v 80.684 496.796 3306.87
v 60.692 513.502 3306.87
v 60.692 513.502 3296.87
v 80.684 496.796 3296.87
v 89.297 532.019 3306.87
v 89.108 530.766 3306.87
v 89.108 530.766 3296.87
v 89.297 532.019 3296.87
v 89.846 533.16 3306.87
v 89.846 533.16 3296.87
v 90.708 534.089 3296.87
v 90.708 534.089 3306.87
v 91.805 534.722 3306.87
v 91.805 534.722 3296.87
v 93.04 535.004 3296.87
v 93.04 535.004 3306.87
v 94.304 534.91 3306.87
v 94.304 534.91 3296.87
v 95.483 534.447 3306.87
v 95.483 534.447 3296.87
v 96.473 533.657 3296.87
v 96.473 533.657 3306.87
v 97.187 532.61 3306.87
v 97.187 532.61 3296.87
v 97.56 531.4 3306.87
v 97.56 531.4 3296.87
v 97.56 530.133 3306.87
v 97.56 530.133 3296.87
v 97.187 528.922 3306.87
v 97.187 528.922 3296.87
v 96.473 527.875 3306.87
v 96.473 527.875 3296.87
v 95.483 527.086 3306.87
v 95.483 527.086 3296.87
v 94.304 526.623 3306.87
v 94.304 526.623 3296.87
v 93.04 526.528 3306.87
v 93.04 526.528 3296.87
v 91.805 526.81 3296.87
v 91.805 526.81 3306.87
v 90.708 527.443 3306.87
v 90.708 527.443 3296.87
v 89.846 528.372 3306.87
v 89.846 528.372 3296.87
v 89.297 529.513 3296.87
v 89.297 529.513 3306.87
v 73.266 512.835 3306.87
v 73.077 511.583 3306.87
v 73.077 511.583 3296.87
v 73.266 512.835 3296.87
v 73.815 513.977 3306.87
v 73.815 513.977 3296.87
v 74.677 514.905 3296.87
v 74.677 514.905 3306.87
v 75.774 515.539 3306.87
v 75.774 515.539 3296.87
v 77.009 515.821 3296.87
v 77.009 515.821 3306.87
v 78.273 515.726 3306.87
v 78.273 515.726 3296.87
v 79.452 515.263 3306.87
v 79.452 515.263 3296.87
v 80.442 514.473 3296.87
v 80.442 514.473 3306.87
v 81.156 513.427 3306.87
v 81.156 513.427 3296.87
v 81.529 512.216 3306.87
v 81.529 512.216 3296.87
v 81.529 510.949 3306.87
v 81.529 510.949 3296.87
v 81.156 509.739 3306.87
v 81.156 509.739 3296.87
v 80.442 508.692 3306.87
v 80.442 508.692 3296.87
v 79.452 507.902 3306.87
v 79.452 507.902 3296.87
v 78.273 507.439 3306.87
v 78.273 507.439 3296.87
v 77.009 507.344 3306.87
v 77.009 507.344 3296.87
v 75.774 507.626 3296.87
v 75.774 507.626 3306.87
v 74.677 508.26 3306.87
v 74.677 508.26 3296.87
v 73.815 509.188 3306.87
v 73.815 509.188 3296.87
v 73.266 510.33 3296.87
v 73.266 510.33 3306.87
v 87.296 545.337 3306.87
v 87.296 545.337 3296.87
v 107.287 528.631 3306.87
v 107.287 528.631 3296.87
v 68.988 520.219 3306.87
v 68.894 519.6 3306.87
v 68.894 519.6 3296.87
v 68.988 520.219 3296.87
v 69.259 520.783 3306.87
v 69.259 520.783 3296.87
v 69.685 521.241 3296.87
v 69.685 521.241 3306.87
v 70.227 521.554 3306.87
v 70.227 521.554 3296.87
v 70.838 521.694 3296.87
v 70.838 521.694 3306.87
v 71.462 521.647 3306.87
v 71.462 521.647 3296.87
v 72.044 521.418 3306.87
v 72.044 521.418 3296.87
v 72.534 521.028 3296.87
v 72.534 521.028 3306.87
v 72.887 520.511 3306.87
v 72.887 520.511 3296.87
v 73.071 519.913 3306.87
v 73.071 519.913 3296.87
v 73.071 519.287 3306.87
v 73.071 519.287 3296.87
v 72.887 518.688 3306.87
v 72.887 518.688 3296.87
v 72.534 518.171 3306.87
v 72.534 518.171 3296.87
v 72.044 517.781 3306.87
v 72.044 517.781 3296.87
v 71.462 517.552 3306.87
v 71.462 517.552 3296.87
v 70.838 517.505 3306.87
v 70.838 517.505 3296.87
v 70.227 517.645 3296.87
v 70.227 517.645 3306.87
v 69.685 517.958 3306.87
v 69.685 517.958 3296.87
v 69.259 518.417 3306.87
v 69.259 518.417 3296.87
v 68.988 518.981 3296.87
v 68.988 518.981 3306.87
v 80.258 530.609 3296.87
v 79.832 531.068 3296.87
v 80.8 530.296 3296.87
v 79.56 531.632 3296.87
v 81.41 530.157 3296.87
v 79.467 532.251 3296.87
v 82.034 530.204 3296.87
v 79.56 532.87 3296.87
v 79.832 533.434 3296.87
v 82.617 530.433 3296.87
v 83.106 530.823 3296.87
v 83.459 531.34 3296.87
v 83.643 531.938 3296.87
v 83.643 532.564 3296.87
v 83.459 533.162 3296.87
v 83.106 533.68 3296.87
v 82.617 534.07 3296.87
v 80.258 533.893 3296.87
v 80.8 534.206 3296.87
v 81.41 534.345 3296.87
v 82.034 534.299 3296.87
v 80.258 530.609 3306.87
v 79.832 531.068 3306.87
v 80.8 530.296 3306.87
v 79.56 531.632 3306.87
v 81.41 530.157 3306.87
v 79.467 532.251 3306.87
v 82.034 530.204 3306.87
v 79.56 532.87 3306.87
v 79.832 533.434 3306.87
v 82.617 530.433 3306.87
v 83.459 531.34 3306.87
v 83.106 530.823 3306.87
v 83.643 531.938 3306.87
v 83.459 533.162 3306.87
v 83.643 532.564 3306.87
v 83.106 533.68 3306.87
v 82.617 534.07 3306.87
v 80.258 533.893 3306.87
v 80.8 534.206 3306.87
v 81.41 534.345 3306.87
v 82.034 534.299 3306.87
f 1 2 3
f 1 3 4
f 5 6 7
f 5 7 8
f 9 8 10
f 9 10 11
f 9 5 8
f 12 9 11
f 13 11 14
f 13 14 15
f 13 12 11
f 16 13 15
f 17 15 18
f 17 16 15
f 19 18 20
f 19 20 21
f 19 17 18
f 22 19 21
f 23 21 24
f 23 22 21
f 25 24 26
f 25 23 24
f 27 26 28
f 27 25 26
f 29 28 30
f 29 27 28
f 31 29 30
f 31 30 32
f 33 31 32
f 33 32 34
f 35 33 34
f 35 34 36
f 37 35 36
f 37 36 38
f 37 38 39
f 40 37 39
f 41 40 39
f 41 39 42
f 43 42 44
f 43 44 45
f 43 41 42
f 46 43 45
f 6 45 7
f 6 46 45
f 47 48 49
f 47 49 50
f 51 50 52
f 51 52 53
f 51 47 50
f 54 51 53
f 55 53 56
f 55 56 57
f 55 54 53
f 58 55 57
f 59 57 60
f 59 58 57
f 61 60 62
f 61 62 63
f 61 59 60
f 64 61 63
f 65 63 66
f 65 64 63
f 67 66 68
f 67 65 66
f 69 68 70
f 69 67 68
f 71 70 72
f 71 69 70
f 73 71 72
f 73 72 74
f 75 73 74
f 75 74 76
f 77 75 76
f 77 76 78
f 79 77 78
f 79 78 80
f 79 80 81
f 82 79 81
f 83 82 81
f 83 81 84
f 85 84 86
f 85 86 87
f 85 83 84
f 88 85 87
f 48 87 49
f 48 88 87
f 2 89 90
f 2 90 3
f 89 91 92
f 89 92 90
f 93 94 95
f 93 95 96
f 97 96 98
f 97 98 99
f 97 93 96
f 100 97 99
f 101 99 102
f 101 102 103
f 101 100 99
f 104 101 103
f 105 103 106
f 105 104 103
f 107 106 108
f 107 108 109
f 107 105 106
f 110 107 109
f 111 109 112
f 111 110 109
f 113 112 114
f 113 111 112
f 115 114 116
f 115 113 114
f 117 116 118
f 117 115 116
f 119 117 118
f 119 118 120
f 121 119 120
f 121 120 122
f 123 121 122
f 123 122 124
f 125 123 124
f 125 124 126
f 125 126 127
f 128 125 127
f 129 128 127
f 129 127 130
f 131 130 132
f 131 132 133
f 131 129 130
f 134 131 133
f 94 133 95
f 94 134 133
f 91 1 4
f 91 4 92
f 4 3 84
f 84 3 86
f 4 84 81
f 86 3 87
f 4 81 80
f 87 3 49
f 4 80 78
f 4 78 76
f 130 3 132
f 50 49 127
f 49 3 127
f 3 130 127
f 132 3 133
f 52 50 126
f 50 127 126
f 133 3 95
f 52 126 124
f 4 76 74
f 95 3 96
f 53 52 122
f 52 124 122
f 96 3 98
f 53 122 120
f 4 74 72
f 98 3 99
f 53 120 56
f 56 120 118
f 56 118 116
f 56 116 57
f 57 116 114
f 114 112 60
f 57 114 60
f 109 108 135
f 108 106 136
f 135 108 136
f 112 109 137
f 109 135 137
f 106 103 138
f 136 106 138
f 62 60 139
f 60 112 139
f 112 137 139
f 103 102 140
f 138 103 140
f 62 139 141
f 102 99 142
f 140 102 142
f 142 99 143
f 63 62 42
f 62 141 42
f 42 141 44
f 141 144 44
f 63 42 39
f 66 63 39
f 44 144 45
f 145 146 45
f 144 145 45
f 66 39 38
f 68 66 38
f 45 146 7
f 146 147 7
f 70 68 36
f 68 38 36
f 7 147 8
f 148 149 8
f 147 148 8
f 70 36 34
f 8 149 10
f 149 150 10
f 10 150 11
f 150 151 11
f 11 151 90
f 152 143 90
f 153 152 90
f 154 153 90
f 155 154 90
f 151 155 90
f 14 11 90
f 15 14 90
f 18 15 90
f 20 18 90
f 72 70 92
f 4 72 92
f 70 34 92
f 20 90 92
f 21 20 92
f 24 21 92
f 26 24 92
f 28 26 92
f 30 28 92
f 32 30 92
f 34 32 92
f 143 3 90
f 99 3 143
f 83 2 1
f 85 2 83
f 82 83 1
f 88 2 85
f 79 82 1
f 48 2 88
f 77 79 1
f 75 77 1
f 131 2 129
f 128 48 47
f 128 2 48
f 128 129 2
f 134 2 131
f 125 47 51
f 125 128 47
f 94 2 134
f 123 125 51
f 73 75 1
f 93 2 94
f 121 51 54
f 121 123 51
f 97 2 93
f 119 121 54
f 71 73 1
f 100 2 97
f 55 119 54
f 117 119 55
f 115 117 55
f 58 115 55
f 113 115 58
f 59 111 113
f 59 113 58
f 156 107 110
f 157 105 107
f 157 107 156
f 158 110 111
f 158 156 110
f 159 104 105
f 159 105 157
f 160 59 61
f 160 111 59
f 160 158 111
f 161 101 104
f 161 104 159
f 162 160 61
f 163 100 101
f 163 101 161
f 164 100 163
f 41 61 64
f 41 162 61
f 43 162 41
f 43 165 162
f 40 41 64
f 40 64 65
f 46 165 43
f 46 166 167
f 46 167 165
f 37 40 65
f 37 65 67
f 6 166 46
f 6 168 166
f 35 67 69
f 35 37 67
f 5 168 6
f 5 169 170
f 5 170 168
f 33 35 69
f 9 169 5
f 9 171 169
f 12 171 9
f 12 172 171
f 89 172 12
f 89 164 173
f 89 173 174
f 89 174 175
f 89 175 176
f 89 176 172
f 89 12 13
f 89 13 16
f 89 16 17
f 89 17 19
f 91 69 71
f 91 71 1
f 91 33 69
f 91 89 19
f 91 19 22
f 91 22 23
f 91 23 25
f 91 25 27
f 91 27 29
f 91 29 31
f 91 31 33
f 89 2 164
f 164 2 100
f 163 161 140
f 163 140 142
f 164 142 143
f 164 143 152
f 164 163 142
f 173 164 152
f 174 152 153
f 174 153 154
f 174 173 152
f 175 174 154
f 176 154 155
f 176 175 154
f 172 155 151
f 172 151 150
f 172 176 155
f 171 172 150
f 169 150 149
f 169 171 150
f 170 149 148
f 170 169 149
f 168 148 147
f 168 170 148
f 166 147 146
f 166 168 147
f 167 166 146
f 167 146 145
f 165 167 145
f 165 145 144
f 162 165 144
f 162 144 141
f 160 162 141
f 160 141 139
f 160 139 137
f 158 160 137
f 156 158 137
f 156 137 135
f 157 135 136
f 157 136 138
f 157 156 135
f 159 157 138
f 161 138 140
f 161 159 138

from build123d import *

# Parameters (mm, degrees)
SKETCH2_R           = 4.25
SKETCH2_R_2         = 2.1
BOSS_EXTRUDE1_DEPTH = 10


with BuildPart() as part:
    # Sketch2 → Boss-Extrude1 (new body)
    with BuildSketch(Plane(origin=(0, 0, 3306.870187265), x_dir=(-1, 0, 0), z_dir=(0, 0, -1))):
        Polygon((-107.287132076, 528.630767378), (-87.295661635, 545.336840216), (-60.692285166, 513.501673478), (-80.683755608, 496.79560064), align=None)
        with Locations((-77.326966288, 511.582577545)):
            Circle(SKETCH2_R, mode=Mode.SUBTRACT)
        with Locations((-93.357902826, 530.766140137)):
            Circle(SKETCH2_R, mode=Mode.SUBTRACT)
        with Locations((-81.566936891, 532.251222865)):
            Circle(SKETCH2_R_2, mode=Mode.SUBTRACT)
        with Locations((-70.99449696, 519.599618719)):
            Circle(SKETCH2_R_2, mode=Mode.SUBTRACT)
    extrude(amount=BOSS_EXTRUDE1_DEPTH)


solid = part.part
